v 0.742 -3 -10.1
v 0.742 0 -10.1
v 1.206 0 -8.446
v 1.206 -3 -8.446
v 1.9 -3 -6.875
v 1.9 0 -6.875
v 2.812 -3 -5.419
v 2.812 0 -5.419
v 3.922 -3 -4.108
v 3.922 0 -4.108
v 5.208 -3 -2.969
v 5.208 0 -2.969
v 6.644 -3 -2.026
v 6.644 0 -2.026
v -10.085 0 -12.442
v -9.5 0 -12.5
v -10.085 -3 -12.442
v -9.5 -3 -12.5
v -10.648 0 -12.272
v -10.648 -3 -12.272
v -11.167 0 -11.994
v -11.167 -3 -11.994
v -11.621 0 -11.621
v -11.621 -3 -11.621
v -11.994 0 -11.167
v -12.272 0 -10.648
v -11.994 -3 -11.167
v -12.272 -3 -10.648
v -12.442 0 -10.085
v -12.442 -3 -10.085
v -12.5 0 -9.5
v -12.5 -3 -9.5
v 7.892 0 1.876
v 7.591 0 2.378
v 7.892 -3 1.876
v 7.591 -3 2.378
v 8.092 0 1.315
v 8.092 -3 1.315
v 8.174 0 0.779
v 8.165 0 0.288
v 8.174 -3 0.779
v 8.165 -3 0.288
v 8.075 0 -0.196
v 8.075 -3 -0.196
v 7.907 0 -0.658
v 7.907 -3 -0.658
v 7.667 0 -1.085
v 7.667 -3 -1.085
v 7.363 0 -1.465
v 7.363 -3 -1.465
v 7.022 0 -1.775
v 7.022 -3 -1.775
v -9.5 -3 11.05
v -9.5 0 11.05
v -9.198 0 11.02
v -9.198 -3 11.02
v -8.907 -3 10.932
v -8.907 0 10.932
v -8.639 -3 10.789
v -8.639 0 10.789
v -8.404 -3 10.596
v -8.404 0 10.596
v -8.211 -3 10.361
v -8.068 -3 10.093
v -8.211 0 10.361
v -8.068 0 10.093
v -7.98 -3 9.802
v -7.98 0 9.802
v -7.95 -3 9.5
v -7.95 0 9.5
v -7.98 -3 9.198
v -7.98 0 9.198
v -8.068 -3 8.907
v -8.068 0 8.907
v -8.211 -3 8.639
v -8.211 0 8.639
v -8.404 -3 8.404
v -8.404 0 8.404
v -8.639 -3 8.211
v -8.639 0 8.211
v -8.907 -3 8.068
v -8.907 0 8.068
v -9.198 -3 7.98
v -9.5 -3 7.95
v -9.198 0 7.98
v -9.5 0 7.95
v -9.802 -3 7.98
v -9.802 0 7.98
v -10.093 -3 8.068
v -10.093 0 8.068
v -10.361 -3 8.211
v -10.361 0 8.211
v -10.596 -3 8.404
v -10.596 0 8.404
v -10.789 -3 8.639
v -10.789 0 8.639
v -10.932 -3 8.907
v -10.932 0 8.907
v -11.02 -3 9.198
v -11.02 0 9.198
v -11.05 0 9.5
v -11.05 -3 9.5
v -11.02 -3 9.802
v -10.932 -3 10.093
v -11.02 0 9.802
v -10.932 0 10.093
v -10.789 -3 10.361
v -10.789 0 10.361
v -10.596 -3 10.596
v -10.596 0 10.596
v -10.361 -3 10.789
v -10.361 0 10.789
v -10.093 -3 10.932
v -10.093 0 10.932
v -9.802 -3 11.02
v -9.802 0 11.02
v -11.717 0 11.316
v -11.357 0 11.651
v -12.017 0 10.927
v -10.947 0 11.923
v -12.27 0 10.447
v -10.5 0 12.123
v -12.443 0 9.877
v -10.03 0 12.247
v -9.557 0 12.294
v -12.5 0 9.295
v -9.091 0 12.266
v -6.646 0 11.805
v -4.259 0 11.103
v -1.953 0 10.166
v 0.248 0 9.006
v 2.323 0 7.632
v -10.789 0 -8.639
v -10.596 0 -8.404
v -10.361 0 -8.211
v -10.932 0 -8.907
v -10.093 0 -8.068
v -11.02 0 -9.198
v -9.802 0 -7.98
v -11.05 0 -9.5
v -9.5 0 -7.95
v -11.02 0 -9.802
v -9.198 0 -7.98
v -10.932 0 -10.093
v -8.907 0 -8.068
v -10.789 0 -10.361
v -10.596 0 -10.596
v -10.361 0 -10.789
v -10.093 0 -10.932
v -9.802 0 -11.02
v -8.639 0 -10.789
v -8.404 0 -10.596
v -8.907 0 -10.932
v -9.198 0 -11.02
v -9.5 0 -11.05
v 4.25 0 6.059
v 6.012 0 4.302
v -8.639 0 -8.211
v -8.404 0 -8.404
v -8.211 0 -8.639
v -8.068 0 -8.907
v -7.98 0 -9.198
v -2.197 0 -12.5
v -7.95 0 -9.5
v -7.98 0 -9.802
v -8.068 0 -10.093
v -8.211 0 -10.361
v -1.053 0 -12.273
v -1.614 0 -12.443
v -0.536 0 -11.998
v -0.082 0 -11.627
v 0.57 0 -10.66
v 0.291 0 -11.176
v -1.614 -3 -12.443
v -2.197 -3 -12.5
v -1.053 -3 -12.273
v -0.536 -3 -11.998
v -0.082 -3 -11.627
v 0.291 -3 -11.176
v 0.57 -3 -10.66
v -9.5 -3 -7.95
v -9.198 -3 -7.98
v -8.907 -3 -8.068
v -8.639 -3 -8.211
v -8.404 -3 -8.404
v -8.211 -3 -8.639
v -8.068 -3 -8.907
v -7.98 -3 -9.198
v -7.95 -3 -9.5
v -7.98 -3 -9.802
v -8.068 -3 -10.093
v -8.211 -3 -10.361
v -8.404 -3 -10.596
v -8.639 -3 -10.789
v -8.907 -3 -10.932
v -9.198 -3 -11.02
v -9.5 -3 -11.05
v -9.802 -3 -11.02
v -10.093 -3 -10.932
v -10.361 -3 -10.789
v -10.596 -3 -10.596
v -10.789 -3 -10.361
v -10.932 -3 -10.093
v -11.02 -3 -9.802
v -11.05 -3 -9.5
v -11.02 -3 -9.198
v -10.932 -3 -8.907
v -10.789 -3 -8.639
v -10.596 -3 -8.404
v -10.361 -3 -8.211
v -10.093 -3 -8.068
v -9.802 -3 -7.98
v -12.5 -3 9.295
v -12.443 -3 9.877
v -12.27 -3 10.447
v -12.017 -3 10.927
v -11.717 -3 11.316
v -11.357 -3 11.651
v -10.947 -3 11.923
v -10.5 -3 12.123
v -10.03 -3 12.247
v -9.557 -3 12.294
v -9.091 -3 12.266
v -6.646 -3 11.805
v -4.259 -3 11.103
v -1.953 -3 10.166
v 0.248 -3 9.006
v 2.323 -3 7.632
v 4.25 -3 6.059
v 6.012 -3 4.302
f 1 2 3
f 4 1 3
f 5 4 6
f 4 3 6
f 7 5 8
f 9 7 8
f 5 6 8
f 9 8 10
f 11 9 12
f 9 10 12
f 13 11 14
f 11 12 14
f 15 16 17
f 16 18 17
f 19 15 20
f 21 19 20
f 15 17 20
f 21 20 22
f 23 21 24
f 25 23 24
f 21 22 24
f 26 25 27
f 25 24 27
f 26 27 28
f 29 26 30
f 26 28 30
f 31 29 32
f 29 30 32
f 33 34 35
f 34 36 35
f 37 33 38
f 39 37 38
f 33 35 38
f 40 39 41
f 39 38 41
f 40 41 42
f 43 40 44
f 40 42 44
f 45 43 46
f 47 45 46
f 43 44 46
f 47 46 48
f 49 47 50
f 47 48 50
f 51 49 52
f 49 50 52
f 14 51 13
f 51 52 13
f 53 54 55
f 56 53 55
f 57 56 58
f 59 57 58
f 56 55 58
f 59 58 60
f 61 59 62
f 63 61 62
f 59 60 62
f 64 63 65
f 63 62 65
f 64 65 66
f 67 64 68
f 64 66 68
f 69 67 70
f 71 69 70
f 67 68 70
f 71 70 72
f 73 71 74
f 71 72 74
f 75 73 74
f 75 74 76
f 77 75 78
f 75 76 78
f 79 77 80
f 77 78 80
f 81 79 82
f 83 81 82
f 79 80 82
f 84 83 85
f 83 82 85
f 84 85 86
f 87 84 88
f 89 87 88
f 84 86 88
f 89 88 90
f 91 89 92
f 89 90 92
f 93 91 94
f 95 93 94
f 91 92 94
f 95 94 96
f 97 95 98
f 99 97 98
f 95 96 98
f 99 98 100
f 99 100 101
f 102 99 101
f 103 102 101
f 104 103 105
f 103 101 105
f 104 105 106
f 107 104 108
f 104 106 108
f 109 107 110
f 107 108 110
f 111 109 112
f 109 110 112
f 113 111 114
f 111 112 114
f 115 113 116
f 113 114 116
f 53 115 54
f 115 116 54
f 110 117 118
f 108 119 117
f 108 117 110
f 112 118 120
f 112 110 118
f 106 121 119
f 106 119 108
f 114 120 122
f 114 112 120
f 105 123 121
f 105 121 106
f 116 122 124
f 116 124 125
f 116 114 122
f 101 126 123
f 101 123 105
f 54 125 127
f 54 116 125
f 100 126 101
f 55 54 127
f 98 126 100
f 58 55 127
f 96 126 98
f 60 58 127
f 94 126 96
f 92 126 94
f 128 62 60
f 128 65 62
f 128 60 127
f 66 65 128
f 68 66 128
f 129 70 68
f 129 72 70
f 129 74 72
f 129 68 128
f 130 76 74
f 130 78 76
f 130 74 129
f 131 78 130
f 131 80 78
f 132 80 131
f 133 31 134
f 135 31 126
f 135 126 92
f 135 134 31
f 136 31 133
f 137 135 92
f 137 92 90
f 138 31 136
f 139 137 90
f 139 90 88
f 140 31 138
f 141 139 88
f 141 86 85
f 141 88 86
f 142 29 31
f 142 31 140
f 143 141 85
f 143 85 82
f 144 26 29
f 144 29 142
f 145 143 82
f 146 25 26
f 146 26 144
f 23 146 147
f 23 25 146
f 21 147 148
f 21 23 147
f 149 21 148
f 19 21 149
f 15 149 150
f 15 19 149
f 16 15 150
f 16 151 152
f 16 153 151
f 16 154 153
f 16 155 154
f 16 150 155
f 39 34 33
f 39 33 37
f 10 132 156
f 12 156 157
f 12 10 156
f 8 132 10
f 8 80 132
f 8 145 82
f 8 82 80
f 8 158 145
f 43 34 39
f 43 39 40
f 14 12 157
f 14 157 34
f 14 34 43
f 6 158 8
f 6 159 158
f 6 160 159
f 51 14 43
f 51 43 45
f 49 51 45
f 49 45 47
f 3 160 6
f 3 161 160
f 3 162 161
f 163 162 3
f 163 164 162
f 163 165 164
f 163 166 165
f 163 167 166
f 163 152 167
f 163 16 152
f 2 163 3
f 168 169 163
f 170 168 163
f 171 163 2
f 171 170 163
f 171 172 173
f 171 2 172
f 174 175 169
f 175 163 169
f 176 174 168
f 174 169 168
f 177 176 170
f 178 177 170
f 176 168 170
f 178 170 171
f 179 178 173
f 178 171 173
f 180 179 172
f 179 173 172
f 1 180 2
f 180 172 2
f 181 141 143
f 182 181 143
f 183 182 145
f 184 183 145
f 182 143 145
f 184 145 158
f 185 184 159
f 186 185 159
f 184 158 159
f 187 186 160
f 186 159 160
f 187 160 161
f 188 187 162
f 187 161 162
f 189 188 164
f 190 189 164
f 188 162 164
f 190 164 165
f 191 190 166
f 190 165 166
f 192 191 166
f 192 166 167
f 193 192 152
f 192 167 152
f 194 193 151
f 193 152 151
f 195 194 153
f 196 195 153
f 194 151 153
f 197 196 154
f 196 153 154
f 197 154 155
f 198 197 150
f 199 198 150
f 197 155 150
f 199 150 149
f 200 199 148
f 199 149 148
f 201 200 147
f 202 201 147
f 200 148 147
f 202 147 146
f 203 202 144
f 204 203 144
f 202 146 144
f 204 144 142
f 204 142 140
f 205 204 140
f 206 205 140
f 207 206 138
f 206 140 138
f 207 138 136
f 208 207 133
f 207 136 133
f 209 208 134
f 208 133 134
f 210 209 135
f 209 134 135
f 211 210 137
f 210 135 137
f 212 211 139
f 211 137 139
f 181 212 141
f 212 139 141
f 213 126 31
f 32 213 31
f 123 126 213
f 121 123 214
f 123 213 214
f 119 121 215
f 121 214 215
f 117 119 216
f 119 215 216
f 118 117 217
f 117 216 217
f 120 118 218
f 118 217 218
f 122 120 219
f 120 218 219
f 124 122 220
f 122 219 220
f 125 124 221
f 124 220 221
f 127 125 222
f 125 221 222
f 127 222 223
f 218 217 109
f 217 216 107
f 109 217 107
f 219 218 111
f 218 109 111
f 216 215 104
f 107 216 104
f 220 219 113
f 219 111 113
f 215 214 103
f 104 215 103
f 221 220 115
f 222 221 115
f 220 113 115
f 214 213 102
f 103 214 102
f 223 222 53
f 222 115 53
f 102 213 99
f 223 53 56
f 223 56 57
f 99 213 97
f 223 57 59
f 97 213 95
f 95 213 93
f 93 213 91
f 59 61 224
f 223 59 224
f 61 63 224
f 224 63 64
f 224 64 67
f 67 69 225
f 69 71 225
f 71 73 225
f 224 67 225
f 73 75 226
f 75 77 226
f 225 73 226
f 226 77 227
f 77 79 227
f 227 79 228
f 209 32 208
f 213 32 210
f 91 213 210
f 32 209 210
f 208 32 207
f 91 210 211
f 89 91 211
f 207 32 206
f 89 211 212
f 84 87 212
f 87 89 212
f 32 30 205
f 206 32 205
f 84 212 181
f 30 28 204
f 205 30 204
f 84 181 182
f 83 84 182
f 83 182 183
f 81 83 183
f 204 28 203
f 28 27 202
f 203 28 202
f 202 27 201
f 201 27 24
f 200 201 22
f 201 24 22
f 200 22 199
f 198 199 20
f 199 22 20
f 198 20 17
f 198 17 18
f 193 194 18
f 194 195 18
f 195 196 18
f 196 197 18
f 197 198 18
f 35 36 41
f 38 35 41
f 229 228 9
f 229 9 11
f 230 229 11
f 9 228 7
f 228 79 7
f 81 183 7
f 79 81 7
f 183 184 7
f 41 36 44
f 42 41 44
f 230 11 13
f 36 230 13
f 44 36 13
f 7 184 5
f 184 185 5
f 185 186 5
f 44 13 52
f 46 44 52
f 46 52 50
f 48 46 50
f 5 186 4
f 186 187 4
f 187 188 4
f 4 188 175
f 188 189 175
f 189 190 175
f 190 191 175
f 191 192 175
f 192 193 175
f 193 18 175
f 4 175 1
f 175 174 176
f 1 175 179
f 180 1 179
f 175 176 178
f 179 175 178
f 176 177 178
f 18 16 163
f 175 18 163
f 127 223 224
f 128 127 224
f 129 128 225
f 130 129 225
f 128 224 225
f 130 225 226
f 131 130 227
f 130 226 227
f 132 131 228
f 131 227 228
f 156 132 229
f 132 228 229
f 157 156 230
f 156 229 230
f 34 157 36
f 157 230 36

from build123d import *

# Parameters (mm, degrees)
SKETCH1_W              = 25
SKETCH1_H              = 25
SKETCH1_R              = 1.55
BOSS_EXTRUDE1_DEPTH    = 3
FILLET1_R              = 25
CUT_EXTRUDE1_OUTLINE_W = 12
CUT_EXTRUDE1_OUTLINE_H = 3
FILLET3_R              = 3
FILLET4_R              = 3


# Read off the part's stored shape, not the designer's step: Cut-Extrude1
with BuildPart() as part:
    # Sketch1 → Boss-Extrude1 (new body)
    with BuildSketch(Plane(origin=(0, 0, 0), x_dir=(1, 0, 0), z_dir=(0, 1, 0))):
        Rectangle(SKETCH1_W, SKETCH1_H)
        with Locations(Location((-9.5, 9.5, 0), (0, 0, 270))):
            Circle(SKETCH1_R, mode=Mode.SUBTRACT)
        with Locations(Location((-9.5, -9.5, 0), (0, 0, 270))):
            Circle(SKETCH1_R, mode=Mode.SUBTRACT)
    extrude(amount=-BOSS_EXTRUDE1_DEPTH)

    # Fillet1
    fillet1_edges = [part.edges().sort_by_distance(p)[0] for p in [
        (12.5, -1.5, 12.5),
    ]]
    fillet(fillet1_edges, radius=FILLET1_R - 0.0001)  # a hair under: the kernel refuses the full size

    # Cut-Extrude1 outline → Cut-Extrude1 (revolve, cut)
    with BuildSketch(Plane(origin=(12.5, 0, -12.5), x_dir=(1, 0, 0), z_dir=(0, 0, 1))):
        with Locations((6, -1.5)):
            Rectangle(CUT_EXTRUDE1_OUTLINE_W, CUT_EXTRUDE1_OUTLINE_H)
    revolve(axis=Axis((12.5, 0, -12.5), (0, 1, 0)), mode=Mode.SUBTRACT)

    # Fillet3
    fillet3_edges = [part.edges().sort_by_distance(p)[0] for p in [
        (9.620035077, -1.5, -0.850716673),
        (0.5, -1.5, -12.5),
    ]]
    fillet(fillet3_edges, radius=FILLET3_R)

    # Fillet4
    fillet4_edges = [part.edges().sort_by_distance(p)[0] for p in [
        (-12.5, -1.5, 12.5),
        (-12.5, -1.5, -12.5),
    ]]
    fillet(fillet4_edges, radius=FILLET4_R)


solid = part.part
